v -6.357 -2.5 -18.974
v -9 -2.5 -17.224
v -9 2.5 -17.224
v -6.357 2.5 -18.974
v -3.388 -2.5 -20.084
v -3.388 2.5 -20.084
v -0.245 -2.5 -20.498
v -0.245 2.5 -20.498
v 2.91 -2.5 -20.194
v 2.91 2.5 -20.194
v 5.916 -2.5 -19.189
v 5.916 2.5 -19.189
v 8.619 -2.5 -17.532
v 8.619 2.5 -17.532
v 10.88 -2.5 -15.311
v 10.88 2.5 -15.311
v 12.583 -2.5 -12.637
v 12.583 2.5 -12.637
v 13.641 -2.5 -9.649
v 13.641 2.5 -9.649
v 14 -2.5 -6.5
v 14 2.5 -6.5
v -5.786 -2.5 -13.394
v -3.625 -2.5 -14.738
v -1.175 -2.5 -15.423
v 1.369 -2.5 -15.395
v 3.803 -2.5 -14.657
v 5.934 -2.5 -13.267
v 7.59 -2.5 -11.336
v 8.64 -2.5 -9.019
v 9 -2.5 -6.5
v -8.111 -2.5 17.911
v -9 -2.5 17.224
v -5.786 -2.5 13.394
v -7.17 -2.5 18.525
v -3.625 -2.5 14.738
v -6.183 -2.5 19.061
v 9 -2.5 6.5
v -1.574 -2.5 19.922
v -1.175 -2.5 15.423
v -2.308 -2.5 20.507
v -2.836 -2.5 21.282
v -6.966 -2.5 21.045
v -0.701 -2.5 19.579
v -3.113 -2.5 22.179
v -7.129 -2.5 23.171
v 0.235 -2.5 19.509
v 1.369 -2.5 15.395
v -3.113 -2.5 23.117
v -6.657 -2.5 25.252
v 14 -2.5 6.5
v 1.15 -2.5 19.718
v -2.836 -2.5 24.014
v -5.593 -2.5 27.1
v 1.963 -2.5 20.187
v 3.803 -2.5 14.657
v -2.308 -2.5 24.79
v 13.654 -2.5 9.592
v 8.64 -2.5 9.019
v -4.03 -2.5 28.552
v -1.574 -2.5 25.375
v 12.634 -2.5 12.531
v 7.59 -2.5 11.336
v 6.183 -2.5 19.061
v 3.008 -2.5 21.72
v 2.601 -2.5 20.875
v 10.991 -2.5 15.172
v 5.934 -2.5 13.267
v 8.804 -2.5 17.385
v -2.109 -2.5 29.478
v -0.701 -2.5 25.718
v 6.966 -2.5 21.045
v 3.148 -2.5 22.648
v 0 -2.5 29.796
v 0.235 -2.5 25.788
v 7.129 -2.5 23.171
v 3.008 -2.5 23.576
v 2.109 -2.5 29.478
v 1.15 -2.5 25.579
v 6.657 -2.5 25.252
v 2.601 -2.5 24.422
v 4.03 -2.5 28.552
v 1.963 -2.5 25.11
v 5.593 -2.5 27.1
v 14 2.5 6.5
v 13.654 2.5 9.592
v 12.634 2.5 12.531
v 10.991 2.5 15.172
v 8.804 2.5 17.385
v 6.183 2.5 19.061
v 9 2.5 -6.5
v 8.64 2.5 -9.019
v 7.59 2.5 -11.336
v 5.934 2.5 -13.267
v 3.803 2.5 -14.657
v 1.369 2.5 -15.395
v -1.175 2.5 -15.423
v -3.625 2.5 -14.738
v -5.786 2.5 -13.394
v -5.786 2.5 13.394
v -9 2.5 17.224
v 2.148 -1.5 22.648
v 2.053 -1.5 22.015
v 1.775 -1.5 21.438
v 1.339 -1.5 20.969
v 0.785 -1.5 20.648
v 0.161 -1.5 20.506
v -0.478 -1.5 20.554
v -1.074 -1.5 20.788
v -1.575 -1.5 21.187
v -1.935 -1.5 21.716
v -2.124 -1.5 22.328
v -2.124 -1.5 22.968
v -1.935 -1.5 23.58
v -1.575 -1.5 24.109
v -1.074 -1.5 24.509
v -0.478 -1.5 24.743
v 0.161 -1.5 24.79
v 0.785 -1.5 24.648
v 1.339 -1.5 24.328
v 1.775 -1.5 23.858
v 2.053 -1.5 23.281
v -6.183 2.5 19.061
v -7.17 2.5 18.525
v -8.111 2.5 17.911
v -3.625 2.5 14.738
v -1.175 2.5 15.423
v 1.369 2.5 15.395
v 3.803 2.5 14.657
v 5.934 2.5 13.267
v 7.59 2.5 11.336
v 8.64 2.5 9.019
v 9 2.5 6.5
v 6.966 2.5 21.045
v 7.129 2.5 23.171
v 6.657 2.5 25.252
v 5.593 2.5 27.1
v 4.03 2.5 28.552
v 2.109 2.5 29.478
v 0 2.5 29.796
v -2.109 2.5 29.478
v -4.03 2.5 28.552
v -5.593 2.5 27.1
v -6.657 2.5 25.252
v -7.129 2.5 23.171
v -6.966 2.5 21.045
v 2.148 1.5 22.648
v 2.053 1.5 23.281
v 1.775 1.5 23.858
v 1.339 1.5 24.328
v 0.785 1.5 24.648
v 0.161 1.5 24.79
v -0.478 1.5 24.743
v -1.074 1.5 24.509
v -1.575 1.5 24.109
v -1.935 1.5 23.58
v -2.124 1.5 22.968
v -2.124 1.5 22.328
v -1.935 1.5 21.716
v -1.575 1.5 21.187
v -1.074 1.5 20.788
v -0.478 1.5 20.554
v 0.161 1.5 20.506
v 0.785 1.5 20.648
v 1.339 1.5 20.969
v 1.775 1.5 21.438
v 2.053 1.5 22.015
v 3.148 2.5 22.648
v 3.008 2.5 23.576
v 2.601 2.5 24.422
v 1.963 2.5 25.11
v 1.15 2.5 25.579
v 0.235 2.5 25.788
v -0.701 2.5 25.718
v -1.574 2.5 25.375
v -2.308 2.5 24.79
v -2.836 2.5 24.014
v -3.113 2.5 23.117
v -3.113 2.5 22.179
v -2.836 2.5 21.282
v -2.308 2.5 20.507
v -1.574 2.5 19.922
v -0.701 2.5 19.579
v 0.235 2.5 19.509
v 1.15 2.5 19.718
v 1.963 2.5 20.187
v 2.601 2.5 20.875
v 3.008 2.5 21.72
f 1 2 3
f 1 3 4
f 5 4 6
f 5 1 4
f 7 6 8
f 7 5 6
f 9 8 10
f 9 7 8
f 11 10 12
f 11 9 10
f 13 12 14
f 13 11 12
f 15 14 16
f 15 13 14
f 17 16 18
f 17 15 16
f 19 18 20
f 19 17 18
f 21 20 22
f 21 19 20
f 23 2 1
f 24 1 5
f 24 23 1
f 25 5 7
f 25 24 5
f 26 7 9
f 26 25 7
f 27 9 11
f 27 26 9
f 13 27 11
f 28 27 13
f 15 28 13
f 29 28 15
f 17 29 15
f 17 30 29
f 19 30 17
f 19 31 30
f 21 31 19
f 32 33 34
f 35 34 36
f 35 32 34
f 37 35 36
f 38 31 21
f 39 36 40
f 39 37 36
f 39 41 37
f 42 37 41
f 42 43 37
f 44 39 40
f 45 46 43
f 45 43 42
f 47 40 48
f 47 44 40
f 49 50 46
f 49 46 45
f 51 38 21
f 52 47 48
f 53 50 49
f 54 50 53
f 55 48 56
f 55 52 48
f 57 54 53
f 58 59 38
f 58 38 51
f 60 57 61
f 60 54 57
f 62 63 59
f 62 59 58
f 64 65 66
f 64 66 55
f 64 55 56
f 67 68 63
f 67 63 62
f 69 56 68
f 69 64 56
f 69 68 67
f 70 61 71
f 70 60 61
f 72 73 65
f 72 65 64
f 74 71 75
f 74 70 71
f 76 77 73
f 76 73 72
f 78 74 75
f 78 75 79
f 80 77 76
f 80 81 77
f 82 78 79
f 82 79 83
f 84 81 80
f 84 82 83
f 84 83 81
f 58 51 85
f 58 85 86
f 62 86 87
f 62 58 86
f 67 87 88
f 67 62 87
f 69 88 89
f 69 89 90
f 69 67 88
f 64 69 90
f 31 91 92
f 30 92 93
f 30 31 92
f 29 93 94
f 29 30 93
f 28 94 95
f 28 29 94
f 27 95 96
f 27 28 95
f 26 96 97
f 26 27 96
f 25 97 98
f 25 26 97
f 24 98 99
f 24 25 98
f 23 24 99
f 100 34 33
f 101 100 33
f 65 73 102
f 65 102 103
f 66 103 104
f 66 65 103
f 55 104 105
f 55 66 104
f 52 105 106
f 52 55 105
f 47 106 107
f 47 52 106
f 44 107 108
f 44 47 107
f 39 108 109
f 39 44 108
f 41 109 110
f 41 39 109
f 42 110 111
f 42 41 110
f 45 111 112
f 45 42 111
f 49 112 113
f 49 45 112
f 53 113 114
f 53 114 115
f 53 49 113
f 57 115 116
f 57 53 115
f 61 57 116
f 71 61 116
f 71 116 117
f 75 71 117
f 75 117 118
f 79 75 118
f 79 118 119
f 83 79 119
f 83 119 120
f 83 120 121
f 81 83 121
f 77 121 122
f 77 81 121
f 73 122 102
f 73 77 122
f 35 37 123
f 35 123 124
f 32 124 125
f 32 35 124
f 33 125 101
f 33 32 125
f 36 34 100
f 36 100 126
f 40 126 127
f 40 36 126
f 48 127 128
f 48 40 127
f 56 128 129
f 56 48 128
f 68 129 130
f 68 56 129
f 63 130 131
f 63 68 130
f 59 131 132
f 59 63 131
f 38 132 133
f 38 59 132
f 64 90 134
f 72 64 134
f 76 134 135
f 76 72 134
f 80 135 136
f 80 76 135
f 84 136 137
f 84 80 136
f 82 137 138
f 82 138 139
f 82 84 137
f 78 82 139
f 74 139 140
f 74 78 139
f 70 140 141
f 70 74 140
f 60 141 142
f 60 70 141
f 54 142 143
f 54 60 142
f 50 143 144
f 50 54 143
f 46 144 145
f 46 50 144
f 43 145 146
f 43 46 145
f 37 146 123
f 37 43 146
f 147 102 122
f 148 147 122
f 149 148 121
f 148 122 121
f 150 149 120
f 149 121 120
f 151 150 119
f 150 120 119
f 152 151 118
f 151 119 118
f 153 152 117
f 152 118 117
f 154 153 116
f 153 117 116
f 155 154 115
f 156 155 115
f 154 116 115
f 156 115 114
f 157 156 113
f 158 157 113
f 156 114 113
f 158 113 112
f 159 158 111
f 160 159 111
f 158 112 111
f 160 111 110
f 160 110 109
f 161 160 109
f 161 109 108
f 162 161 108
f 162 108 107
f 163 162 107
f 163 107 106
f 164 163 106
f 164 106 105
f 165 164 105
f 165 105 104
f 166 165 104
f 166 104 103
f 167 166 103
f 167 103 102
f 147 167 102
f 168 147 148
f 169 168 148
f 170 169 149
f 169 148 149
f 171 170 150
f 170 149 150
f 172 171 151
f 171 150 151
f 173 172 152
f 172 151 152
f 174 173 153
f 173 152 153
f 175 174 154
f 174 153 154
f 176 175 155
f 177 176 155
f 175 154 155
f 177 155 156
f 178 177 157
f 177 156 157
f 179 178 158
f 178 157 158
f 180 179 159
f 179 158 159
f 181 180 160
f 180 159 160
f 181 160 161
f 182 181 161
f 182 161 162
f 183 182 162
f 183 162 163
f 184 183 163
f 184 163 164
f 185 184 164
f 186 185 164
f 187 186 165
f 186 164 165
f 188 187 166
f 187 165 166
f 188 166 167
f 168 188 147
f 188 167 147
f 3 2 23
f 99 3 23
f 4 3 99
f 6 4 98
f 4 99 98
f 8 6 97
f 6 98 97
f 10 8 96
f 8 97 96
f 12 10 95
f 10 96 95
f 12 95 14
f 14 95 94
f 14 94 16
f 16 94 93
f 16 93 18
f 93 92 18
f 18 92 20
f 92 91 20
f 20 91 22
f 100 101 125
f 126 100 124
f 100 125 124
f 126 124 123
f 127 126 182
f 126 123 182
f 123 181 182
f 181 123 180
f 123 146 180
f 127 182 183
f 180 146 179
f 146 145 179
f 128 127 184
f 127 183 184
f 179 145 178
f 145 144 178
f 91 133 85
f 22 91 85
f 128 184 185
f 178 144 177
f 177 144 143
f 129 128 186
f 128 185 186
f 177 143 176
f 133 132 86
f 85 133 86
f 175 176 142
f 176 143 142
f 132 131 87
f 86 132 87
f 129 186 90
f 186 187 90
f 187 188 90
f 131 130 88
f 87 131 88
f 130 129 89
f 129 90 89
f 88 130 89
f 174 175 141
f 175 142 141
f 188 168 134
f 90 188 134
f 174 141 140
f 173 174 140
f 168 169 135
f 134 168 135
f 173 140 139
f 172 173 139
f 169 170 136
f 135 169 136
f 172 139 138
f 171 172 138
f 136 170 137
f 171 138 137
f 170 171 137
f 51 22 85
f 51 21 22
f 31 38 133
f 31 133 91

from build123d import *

# Parameters (mm, degrees)
F1_DEPTH = 2.5
F3_DEPTH = 5.001
F4_R     = 7.148228
F4_R_2   = 2.148228
F5_DEPTH = 5
F6_SIZE  = 1


with BuildPart() as f1:
    # F0 (on Front) → F1 (new body, symmetric)
    with BuildSketch(Plane.XZ):
        with BuildLine():
            Line((14, -6.5), (14, 6.5))
            ThreePointArc((14, 6.5), (0, 20.5), (-14, 6.5))
            Line((-14, 6.5), (-14, -6.5))
            ThreePointArc((-14, -6.5), (0, -20.5), (14, -6.5))
        make_face()
        with BuildLine():
            Line((9, 6.5), (9, -6.5))
            ThreePointArc((9, -6.5), (0, -15.5), (-9, -6.5))
            Line((-9, -6.5), (-9, 6.5))
            ThreePointArc((-9, 6.5), (0, 15.5), (9, 6.5))
        make_face(mode=Mode.SUBTRACT)
    extrude(amount=F1_DEPTH, both=True)

    # F2 (on face) → F3 (cut, through all)
    with BuildSketch(Plane.XZ.offset(2.5)):
        with BuildLine():
            Line((-5.785714, 13.393875), (-9, 17.223805))
            ThreePointArc((-9, 17.223805), (-12.688578, 12.41608), (-14, 6.5))
            Line((-14, 6.5), (-14, -6.5))
            ThreePointArc((-14, -6.5), (-12.688578, -12.41608), (-9, -17.223805))
            Line((-9, -17.223805), (-5.785714, -13.393875))
            ThreePointArc((-5.785714, -13.393875), (-8.156943, -10.303194), (-9, -6.5))
            Line((-9, -6.5), (-9, 6.5))
            ThreePointArc((-9, 6.5), (-8.156943, 10.303194), (-5.785714, 13.393875))
        make_face()
    extrude(amount=-F3_DEPTH, mode=Mode.SUBTRACT)

    # F4 (on face) → F5 (join, through all)
    with BuildSketch(Plane.XZ.offset(2.5)):
        with Locations((0, 22.648228)):
            Circle(F4_R)
        with Locations((0, 22.648228)):
            Circle(F4_R_2, mode=Mode.SUBTRACT)
    extrude(amount=-F5_DEPTH)

    # F6
    f6_edges = [f1.edges().sort_by_distance(p)[0] for p in [
        (2.148228, 0, 22.648228),
        (-2.148228, -2.5, 22.648228),
        (-2.148228, 2.5, 22.648228),
    ]]
    chamfer(f6_edges, length=F6_SIZE)


solid = f1.part
